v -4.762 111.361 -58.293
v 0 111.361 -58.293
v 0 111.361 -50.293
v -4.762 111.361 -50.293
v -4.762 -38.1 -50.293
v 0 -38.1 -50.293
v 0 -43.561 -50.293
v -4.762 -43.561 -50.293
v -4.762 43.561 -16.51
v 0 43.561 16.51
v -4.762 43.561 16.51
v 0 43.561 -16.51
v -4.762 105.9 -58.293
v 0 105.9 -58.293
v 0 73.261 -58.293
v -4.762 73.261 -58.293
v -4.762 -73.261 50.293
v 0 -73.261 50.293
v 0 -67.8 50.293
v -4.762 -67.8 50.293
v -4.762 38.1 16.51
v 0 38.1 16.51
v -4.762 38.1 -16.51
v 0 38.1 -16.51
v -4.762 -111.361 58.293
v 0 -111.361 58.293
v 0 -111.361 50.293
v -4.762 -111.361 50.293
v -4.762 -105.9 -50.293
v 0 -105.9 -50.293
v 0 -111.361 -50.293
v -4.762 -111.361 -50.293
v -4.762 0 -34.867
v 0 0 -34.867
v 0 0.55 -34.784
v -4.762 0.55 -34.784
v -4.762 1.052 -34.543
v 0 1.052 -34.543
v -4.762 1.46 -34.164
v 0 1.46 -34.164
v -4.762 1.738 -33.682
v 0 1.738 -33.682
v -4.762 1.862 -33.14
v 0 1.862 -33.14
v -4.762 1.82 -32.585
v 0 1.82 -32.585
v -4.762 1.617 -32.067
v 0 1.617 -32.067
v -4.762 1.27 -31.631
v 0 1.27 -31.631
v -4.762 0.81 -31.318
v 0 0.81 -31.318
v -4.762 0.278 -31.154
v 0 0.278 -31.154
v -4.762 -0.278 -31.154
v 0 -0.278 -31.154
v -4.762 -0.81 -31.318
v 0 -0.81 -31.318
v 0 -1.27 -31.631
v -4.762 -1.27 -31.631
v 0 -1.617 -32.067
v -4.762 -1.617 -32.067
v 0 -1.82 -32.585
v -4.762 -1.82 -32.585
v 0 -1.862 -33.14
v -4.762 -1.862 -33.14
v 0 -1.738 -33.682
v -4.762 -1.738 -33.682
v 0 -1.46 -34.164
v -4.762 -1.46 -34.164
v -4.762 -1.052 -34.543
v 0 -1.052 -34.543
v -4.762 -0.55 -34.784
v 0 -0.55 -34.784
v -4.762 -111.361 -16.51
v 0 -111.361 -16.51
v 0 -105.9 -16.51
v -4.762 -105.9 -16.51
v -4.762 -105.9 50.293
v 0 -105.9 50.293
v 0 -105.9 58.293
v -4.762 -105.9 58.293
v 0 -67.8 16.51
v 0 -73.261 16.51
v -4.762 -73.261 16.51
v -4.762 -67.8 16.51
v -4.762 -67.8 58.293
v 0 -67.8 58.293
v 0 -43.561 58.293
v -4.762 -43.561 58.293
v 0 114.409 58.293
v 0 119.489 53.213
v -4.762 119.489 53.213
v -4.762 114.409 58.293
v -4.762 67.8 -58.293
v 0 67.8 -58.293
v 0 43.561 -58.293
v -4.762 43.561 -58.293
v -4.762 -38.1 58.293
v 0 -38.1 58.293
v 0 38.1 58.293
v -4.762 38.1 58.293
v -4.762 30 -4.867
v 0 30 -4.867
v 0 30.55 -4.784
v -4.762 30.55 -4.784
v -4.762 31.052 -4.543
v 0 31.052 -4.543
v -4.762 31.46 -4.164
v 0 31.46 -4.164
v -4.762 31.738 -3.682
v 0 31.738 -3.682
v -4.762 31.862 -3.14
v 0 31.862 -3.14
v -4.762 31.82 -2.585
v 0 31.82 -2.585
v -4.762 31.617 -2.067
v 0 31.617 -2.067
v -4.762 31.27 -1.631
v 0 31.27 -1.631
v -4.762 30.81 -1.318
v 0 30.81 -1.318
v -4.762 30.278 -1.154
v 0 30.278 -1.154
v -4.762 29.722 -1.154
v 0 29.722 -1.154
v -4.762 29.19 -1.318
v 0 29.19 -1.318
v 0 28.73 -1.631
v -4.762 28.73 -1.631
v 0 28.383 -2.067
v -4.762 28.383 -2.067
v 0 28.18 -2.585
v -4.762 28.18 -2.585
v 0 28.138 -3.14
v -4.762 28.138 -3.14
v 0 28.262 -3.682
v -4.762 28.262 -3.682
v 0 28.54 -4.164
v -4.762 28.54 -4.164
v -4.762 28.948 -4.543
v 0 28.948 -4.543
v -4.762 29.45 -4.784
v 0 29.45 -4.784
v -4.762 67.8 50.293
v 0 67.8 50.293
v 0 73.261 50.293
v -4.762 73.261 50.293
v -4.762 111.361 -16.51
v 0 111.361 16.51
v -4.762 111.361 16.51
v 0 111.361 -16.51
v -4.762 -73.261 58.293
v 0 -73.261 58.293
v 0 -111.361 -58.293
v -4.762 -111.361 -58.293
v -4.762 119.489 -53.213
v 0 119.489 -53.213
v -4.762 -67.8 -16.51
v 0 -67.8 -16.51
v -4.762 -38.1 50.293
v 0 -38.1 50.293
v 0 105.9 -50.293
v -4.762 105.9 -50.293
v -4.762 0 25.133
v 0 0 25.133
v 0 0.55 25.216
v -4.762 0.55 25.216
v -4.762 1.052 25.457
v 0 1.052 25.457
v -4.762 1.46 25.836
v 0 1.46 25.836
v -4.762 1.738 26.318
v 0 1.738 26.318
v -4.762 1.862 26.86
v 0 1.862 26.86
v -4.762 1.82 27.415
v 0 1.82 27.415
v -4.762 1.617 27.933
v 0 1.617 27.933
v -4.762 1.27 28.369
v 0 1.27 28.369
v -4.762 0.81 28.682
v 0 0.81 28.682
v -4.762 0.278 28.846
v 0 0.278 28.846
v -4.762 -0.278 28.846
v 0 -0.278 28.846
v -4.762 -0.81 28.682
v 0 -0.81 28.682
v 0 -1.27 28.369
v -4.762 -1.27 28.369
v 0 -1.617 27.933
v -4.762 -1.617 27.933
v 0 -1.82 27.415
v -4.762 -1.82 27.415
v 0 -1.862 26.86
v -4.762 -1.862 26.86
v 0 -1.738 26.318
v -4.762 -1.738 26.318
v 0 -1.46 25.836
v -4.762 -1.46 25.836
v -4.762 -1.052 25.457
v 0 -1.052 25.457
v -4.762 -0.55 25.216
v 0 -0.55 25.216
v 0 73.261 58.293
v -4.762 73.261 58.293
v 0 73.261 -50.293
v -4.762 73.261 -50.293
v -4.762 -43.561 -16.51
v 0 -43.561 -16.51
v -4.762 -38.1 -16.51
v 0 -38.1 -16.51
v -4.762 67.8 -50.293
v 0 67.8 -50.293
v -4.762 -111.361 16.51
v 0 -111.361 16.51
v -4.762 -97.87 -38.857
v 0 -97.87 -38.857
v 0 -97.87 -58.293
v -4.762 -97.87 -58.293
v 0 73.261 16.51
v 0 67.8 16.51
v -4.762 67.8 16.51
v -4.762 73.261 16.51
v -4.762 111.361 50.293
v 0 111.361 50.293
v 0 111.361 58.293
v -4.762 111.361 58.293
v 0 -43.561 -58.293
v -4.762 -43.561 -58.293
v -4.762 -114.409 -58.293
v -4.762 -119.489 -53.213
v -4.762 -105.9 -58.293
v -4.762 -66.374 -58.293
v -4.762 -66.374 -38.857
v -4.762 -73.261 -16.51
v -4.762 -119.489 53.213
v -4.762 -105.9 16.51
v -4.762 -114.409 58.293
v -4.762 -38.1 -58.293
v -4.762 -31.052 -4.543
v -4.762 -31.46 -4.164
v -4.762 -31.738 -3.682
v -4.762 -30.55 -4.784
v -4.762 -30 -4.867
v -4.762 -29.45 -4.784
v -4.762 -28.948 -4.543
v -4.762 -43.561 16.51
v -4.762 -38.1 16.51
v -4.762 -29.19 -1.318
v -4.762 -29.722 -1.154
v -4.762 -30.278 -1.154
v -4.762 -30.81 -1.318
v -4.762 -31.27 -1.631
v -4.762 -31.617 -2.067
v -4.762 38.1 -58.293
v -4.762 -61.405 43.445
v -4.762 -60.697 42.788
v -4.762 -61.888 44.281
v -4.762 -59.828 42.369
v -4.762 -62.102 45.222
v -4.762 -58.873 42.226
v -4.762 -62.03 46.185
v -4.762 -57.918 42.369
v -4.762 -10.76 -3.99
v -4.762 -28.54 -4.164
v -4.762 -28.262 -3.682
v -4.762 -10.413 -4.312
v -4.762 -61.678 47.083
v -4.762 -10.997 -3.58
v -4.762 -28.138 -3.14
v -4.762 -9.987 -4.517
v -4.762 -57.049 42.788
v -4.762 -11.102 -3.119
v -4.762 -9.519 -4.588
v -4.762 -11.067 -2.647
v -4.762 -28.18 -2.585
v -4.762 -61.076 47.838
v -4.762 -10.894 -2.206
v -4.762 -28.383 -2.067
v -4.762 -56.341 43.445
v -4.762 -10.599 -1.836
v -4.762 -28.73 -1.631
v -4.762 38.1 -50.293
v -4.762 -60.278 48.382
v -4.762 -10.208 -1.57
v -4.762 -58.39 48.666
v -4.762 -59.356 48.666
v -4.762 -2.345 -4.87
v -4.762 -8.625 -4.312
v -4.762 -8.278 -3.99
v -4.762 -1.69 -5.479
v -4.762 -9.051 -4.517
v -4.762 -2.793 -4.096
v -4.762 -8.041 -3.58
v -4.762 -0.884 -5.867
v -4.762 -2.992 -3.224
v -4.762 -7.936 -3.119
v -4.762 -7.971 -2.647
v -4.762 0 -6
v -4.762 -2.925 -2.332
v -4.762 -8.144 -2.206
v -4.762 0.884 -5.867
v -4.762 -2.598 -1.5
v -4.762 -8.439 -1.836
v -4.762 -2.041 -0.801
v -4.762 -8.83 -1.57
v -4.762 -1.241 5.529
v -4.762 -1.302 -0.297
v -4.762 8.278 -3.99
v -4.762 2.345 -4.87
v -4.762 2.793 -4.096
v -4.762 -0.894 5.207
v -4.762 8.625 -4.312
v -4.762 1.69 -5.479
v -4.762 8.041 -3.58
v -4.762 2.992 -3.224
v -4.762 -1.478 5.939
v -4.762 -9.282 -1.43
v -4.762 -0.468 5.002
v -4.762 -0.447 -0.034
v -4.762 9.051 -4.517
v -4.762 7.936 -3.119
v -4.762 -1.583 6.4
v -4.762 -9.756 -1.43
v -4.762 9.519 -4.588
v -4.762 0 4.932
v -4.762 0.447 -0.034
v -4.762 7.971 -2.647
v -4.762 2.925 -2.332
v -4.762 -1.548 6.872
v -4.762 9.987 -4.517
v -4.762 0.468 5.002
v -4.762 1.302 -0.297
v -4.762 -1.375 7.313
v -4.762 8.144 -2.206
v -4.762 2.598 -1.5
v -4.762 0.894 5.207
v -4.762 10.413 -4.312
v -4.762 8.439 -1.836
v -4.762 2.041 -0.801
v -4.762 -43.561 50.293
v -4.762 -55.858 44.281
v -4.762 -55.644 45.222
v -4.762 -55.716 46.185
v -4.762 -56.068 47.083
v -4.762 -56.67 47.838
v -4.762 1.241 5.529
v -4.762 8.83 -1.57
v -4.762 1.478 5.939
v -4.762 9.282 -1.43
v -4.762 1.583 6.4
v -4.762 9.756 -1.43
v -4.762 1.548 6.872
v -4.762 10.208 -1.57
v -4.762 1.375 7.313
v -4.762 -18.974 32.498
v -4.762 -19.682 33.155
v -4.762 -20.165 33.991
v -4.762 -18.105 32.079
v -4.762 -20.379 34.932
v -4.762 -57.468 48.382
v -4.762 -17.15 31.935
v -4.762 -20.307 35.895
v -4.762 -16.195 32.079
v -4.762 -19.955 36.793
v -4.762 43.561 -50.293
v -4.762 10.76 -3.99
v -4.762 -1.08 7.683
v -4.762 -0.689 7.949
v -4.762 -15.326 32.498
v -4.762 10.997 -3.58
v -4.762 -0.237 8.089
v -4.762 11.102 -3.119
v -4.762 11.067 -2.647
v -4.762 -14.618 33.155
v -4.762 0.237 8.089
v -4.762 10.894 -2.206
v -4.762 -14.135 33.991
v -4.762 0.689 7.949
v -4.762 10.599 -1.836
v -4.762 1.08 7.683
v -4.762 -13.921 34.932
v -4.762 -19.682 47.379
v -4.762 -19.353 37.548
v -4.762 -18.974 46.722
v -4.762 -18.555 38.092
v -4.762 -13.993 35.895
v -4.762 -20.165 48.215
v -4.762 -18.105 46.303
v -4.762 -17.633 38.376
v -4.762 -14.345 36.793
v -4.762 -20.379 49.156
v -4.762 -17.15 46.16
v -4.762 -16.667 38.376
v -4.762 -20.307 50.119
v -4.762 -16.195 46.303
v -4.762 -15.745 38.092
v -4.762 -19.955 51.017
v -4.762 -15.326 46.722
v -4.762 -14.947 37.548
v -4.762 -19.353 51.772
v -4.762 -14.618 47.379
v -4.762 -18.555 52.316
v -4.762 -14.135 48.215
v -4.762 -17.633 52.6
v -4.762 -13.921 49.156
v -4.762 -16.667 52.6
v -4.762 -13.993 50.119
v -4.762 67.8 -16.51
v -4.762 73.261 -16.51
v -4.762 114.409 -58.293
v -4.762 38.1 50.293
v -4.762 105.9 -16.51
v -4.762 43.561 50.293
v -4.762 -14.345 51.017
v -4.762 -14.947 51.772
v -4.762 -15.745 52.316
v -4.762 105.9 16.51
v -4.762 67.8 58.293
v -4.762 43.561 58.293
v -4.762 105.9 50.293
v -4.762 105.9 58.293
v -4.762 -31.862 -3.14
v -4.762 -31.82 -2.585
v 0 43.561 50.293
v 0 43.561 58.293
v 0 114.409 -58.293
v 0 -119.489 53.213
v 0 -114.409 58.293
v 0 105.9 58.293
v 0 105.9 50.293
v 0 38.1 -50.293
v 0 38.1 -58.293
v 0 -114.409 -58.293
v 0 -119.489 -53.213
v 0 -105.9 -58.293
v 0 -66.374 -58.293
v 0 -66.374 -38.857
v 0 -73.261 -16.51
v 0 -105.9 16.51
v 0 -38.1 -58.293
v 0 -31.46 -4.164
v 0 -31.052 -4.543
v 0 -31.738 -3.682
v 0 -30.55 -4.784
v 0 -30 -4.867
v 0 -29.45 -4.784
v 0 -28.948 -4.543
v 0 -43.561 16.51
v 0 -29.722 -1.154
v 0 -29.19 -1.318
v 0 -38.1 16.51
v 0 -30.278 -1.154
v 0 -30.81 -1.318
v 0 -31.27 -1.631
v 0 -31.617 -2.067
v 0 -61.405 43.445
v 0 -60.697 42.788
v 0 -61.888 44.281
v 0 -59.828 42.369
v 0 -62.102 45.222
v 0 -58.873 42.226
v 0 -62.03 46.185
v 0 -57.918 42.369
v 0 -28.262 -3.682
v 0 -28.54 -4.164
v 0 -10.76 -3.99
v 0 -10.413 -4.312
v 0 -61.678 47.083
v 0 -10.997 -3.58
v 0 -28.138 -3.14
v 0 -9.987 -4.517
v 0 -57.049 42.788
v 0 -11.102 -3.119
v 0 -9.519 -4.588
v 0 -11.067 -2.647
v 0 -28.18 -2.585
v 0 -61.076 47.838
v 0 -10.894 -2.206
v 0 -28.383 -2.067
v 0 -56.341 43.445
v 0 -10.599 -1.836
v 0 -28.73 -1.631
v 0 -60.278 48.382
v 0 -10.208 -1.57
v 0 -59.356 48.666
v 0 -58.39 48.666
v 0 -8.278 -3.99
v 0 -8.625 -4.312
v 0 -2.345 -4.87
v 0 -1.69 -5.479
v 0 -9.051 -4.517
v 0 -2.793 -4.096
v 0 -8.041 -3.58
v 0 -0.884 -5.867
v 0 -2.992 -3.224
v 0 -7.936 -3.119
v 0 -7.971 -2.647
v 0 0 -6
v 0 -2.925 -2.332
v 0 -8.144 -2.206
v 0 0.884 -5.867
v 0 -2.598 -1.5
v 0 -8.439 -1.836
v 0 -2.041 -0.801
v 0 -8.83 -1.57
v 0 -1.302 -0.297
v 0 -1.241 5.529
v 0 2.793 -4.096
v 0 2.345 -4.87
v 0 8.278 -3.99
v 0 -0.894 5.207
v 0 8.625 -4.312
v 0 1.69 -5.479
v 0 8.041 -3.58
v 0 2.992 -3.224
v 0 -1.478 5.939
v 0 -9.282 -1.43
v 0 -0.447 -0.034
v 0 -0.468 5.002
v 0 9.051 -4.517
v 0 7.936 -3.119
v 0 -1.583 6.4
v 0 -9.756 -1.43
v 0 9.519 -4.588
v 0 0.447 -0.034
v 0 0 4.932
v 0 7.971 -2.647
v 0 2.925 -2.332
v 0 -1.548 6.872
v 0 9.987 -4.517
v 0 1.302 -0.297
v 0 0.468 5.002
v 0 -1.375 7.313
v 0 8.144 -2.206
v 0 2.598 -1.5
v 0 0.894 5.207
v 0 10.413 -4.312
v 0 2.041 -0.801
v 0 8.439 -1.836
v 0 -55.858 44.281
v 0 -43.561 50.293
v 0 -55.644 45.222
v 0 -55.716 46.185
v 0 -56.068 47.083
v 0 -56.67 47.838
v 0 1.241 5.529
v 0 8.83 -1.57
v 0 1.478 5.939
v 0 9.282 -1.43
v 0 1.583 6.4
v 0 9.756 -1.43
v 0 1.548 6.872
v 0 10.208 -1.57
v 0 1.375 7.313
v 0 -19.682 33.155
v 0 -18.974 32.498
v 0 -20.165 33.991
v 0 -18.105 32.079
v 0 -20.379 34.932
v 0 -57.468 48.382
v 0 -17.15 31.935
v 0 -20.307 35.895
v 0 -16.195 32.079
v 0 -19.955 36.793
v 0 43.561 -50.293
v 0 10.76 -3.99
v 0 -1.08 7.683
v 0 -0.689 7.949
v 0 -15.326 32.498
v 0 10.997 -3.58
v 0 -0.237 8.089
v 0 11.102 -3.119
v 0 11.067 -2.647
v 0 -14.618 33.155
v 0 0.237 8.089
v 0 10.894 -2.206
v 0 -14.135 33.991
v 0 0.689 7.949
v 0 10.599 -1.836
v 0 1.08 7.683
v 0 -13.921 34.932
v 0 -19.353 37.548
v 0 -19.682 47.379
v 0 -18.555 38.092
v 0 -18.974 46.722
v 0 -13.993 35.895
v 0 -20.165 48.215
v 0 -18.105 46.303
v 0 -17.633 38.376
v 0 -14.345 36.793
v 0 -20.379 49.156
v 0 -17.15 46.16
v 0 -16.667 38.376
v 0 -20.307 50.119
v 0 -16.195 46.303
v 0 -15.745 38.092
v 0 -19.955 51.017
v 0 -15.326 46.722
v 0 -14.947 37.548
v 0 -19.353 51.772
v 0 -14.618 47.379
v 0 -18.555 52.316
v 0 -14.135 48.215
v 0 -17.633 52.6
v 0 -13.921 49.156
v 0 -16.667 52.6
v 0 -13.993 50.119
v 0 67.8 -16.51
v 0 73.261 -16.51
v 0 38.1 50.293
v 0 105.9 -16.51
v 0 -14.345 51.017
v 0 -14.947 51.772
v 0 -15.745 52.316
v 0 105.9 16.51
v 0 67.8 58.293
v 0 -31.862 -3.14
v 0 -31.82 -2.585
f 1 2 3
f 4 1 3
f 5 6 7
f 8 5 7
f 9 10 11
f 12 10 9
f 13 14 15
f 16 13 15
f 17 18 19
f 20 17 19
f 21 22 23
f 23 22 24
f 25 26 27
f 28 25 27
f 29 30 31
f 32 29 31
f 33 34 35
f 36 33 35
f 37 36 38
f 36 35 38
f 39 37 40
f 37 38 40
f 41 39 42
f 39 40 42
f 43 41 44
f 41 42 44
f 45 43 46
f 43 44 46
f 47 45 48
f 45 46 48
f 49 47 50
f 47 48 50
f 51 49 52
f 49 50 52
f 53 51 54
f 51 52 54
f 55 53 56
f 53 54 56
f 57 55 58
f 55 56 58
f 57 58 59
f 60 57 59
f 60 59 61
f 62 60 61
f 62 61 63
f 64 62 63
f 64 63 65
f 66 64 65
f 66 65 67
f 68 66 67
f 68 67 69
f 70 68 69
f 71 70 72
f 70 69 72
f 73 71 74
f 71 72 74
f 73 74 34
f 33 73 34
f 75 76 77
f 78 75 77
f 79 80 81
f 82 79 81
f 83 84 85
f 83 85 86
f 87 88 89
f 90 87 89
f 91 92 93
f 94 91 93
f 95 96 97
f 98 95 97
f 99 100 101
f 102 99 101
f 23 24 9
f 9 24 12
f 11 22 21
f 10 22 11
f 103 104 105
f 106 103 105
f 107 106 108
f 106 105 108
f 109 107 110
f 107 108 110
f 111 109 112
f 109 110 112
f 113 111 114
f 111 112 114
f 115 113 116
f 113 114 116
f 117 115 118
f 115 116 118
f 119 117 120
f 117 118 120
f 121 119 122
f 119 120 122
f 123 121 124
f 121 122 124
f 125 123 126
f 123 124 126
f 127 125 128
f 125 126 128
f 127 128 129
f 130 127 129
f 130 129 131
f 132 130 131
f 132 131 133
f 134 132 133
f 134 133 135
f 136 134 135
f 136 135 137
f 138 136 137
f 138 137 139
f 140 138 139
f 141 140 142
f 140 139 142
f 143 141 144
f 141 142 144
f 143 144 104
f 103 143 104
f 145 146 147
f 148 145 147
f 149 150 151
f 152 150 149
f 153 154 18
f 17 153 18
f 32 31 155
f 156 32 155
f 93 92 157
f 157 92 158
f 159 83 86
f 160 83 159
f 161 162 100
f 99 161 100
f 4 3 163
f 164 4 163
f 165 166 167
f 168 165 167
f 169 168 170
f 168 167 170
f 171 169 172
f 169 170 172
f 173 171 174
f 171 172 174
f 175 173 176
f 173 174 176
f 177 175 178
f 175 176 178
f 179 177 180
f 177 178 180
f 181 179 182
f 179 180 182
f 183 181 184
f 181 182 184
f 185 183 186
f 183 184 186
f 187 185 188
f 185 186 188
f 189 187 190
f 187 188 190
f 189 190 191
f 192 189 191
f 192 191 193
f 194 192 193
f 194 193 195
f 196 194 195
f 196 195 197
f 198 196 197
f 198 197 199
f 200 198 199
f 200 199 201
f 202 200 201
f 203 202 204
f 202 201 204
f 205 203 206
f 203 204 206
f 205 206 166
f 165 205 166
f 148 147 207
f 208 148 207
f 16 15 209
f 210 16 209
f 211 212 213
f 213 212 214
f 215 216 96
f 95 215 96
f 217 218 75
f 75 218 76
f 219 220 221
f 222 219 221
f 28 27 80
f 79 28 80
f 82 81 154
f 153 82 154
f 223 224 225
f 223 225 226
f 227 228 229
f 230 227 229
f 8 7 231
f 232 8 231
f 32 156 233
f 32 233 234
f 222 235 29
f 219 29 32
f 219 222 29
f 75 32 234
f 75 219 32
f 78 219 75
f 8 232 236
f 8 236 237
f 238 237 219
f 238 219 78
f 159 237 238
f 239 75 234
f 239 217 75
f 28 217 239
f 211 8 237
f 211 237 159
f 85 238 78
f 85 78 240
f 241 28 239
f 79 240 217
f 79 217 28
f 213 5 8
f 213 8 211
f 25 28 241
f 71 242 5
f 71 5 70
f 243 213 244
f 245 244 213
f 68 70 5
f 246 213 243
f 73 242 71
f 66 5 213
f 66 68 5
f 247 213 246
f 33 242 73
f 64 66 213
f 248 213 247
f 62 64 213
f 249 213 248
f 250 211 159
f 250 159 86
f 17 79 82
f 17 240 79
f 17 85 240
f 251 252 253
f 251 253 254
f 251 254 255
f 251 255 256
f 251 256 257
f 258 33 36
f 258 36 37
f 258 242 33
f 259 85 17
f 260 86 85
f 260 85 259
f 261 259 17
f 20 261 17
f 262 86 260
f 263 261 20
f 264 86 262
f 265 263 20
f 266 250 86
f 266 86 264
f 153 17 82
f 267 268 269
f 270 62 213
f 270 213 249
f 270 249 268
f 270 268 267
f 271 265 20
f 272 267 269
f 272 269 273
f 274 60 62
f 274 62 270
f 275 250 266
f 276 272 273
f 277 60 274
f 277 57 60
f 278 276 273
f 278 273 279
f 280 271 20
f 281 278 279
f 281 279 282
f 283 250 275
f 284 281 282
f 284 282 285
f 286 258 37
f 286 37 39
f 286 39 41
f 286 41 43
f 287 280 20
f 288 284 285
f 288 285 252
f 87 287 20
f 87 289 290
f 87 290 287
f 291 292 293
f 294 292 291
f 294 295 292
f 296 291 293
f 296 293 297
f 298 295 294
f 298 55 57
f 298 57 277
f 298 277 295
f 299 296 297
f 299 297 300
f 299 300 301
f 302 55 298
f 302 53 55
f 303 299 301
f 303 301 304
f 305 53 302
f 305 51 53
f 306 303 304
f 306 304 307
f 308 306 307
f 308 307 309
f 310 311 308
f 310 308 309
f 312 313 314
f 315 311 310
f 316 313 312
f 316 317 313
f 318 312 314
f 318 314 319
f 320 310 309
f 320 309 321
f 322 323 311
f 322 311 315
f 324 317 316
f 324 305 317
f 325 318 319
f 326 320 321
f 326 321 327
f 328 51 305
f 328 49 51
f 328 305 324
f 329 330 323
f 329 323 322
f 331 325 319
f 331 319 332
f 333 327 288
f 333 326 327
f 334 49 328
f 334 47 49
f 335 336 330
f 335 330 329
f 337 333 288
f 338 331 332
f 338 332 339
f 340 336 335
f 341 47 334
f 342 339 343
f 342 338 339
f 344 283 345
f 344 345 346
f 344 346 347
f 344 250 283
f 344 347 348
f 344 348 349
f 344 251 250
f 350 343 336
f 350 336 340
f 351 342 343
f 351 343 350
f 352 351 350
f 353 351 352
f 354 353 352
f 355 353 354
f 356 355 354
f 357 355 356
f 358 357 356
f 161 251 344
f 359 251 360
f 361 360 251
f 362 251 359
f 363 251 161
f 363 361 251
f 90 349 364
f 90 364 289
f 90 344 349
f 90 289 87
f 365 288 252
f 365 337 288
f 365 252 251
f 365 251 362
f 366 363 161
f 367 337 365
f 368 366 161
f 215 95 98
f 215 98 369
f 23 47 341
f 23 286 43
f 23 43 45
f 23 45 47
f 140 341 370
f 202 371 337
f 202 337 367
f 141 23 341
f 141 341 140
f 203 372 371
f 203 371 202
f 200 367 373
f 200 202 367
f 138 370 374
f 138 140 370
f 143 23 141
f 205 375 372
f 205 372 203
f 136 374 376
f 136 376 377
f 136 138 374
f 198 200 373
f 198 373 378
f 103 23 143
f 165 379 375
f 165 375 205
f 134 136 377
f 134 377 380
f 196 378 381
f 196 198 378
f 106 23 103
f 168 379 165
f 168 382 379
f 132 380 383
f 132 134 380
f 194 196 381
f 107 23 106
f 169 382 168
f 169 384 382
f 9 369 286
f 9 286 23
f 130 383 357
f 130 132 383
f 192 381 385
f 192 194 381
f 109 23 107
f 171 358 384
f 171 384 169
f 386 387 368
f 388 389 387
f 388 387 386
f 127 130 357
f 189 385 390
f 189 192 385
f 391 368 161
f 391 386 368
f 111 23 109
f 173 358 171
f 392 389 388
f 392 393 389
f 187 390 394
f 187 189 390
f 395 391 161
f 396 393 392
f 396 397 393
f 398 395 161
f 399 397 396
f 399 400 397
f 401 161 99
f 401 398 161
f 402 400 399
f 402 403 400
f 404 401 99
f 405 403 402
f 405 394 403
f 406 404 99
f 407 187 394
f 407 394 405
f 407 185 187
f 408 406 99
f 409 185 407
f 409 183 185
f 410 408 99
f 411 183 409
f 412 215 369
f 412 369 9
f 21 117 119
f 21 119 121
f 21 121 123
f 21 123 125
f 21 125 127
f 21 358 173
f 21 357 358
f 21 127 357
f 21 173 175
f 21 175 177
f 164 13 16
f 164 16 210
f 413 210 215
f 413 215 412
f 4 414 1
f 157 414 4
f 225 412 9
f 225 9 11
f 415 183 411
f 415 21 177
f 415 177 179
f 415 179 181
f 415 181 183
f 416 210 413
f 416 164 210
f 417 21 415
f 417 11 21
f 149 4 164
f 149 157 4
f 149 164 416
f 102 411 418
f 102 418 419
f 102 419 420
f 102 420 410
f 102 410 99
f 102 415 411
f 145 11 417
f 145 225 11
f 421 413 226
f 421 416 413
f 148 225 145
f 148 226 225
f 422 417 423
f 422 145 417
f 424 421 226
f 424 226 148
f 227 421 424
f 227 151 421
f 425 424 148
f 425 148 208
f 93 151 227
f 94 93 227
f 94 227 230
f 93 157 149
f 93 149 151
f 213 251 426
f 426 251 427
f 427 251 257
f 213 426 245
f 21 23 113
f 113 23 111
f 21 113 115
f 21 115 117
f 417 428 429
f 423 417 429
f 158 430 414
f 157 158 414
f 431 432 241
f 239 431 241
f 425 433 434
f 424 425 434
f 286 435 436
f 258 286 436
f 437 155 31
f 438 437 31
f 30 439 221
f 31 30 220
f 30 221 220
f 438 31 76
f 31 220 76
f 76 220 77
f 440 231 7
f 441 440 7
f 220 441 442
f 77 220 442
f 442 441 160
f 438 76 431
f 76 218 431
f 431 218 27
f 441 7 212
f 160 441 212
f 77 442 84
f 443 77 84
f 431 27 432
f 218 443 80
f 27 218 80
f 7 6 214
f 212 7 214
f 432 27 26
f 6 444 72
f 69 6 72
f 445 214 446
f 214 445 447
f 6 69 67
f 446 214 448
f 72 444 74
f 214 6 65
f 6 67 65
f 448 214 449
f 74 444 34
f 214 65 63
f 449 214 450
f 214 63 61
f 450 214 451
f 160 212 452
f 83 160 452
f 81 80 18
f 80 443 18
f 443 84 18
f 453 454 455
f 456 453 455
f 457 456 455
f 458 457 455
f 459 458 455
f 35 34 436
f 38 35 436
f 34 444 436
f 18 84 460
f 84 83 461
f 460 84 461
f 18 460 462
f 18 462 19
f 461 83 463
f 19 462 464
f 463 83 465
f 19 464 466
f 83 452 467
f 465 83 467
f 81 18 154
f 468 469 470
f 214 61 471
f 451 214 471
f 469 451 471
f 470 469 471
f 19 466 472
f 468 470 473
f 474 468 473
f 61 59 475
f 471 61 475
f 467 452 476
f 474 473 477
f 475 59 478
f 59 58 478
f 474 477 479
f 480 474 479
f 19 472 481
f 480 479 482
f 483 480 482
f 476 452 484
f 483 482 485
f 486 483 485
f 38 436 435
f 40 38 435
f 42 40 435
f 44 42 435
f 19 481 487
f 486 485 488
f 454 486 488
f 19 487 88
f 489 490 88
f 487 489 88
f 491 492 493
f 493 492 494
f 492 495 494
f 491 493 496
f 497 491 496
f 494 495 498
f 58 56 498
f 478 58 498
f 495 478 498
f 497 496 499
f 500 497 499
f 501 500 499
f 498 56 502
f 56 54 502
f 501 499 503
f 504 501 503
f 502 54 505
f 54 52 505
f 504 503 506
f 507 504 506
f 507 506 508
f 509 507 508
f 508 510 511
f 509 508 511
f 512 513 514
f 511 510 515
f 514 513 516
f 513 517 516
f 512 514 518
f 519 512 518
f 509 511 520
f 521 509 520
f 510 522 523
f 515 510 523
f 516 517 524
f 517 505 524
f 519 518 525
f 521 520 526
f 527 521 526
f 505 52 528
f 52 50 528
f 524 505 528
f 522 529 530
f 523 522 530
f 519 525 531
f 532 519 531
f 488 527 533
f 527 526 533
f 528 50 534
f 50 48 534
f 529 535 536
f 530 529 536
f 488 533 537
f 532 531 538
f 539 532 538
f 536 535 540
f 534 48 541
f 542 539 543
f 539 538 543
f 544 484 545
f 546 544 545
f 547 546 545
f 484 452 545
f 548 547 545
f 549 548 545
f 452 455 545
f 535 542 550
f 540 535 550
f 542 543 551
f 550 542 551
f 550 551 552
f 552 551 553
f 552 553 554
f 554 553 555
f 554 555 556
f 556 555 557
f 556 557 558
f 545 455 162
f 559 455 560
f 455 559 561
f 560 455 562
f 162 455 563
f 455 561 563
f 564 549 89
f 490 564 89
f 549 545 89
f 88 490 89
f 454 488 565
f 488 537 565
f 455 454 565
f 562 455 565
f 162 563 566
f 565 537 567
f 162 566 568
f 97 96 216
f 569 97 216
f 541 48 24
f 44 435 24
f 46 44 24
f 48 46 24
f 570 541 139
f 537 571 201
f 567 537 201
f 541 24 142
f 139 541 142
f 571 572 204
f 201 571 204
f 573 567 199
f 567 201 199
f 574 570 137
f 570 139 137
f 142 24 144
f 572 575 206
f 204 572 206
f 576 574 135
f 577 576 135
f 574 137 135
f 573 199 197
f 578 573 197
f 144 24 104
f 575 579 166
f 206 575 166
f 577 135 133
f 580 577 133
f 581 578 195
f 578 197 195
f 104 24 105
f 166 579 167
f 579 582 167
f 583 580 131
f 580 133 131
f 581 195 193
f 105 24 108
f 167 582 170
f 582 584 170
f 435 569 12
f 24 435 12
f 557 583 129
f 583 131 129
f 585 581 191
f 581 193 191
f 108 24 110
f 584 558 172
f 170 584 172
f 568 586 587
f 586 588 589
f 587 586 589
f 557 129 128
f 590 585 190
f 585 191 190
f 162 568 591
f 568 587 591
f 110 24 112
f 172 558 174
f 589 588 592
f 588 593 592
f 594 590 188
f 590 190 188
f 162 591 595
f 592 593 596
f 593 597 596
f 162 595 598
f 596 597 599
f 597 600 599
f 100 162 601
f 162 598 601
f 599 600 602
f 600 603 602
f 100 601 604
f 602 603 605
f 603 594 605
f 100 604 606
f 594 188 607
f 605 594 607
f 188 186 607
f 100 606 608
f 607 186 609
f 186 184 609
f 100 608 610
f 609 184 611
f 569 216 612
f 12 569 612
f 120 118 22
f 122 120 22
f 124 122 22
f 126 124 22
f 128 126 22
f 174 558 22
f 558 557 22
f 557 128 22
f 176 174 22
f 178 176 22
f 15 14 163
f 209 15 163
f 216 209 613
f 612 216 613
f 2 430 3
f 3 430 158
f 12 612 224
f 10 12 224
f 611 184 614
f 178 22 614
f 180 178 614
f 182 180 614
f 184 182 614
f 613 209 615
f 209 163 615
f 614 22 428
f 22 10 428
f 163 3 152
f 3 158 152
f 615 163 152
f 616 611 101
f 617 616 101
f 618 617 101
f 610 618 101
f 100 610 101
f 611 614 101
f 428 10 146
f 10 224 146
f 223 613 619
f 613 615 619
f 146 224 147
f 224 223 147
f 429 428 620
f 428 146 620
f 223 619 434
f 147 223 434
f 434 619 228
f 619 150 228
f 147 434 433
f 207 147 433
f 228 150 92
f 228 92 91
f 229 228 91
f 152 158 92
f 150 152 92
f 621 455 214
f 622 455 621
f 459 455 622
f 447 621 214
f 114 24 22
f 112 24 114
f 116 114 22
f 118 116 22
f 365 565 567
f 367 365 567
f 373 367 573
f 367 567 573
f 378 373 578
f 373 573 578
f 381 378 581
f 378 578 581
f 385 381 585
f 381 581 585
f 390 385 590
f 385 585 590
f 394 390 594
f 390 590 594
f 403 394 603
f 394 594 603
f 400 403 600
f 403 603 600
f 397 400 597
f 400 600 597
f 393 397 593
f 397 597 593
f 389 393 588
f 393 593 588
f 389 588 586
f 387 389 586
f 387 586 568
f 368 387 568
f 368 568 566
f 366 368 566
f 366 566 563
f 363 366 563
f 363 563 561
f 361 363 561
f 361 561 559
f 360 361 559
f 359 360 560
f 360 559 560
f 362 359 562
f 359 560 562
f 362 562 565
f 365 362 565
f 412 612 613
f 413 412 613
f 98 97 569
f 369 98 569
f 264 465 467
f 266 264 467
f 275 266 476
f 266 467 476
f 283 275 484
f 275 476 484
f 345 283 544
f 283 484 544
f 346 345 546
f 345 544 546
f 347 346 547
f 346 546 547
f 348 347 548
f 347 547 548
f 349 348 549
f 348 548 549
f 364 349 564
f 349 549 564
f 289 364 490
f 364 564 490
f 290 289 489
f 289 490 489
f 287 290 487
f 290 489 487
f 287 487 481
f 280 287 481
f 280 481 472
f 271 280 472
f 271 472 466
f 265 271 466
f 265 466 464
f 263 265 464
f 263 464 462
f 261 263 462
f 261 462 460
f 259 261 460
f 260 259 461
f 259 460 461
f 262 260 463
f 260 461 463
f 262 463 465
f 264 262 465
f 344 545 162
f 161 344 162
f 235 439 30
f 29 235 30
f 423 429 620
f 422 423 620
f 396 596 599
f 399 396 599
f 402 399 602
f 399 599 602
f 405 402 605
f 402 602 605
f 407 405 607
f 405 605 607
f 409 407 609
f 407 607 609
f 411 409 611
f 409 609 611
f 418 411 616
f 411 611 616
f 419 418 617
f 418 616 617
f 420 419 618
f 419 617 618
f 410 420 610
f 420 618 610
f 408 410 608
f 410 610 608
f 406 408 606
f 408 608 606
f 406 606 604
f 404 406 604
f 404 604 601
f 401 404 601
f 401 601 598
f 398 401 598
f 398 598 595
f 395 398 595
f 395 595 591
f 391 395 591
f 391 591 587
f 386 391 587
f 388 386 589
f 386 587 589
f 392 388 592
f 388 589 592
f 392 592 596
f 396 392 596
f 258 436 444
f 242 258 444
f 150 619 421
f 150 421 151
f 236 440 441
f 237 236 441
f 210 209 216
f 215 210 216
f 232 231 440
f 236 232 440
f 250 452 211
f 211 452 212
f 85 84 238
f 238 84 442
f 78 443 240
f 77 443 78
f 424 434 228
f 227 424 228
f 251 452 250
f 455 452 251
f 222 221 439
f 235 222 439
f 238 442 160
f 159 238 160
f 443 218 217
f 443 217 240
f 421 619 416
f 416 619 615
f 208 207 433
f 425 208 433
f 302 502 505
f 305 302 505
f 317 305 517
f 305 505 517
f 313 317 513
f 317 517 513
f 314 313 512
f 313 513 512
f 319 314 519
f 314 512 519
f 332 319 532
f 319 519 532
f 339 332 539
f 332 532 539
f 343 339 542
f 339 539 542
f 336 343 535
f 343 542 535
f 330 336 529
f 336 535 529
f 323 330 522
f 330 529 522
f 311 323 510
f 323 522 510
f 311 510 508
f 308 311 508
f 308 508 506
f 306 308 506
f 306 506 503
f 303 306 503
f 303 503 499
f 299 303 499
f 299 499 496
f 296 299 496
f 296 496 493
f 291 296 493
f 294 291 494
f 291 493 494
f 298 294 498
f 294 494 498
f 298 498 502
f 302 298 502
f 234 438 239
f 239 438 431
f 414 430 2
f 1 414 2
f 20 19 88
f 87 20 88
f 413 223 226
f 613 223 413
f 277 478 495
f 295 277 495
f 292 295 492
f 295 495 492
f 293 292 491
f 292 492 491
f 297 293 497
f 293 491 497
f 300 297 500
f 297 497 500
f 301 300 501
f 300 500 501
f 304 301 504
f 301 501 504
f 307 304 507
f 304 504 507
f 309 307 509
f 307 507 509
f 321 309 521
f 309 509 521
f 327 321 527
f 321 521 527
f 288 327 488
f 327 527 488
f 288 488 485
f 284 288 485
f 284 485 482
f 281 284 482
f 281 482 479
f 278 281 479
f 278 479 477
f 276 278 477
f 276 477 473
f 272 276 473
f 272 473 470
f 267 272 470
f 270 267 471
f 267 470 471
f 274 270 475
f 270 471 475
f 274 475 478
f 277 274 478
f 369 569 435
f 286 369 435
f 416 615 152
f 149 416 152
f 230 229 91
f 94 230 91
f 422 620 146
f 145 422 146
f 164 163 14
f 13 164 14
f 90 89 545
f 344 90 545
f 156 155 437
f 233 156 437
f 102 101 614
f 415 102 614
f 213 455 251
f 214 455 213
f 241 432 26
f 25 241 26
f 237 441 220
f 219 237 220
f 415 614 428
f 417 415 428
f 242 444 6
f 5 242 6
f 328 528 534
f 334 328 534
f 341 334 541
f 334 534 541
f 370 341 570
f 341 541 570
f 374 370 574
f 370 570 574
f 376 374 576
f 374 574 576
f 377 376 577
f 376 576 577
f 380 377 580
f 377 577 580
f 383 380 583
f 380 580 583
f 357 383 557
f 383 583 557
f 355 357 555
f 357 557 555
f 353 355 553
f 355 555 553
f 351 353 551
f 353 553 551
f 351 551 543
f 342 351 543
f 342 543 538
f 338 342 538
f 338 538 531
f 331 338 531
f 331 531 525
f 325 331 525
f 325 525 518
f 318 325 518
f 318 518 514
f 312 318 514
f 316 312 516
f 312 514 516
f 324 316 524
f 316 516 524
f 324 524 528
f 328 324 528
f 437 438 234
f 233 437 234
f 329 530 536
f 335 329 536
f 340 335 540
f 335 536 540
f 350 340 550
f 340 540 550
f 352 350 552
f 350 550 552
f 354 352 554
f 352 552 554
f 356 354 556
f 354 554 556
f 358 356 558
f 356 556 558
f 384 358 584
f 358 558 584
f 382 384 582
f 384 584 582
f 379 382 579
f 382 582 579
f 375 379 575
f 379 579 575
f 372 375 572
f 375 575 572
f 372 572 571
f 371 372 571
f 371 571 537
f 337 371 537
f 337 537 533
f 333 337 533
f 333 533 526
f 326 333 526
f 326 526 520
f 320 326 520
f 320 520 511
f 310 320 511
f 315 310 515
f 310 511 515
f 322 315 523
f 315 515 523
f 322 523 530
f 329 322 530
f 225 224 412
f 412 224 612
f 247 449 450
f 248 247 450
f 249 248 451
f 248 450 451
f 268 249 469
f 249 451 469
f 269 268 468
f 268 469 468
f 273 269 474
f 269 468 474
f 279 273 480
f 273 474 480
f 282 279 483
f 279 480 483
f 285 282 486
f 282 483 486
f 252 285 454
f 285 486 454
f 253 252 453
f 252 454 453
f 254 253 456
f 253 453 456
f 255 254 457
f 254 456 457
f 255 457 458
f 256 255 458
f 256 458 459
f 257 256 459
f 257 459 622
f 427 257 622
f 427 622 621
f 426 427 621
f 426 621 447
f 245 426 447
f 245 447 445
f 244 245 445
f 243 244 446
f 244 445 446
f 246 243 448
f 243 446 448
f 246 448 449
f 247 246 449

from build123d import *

# Parameters (mm, degrees)
SKETCH1_R           = 1.5875
SKETCH1_R_2         = 3
SKETCH1_R_3         = 3.2385
SKETCH1_R_4         = 1.8669
SKETCH1_W           = 33.02
SKETCH1_H           = 5.461
BOSS_EXTRUDE1_DEPTH = 4.7625
CHAMFER1_SIZE       = 5.08


with BuildPart() as part:
    # Sketch1 → Boss-Extrude1 (new body)
    with BuildSketch(Plane(origin=(0, 0, 0), x_dir=(0, 0, -1), z_dir=(1, 0, 0))):
        Polygon((-58.293, 119.489), (58.293, 119.489), (58.293, 111.361), (50.293, 111.361), (50.293, 105.9), (58.293, 105.9), (58.293, 73.261), (50.293, 73.261), (50.293, 67.8), (58.293, 67.8), (58.293, 43.561), (50.293, 43.561), (50.293, 38.1), (58.293, 38.1), (58.293, -38.1), (50.293, -38.1), (50.293, -43.561), (58.293, -43.561), (58.293, -66.374), (38.857, -66.374), (38.857, -97.87), (58.293, -97.87), (58.293, -105.9), (50.293, -105.9), (50.293, -111.361), (58.293, -111.361), (58.293, -119.489), (-58.293, -119.489), (-58.293, -111.361), (-50.293, -111.361), (-50.293, -105.9), (-58.293, -105.9), (-58.293, -73.261), (-50.293, -73.261), (-50.293, -67.8), (-58.293, -67.8), (-58.293, -43.561), (-50.293, -43.561), (-50.293, -38.1), (-58.293, -38.1), (-58.293, 38.1), (-50.293, 38.1), (-50.293, 43.561), (-58.293, 43.561), (-58.293, 67.8), (-50.293, 67.8), (-50.293, 73.261), (-58.293, 73.261), (-58.293, 105.9), (-50.293, 105.9), (-50.293, 111.361), (-58.293, 111.361), align=None)
        with Locations((3, 9.519071488)):
            Circle(SKETCH1_R, mode=Mode.SUBTRACT)
        with Locations((-6.519071488, 0)):
            Circle(SKETCH1_R, mode=Mode.SUBTRACT)
        with Locations((3, -9.519071488)):
            Circle(SKETCH1_R, mode=Mode.SUBTRACT)
        with Locations((3, 0)):
            Circle(SKETCH1_R_2, mode=Mode.SUBTRACT)
        with Locations((-35.174, -17.15)):
            Circle(SKETCH1_R_3, mode=Mode.SUBTRACT)
        with Locations((-49.398, -17.15)):
            Circle(SKETCH1_R_3, mode=Mode.SUBTRACT)
        with Locations((-45.464, -58.872973782)):
            Circle(SKETCH1_R_3, mode=Mode.SUBTRACT)
        with Locations((33, 0)):
            Circle(SKETCH1_R_4, mode=Mode.SUBTRACT)
        with Locations((3, 30)):
            Circle(SKETCH1_R_4, mode=Mode.SUBTRACT)
        with Locations((-27, 0)):
            Circle(SKETCH1_R_4, mode=Mode.SUBTRACT)
        with Locations((3, -30)):
            Circle(SKETCH1_R_4, mode=Mode.SUBTRACT)
        with Locations((0, 108.6305)):
            Rectangle(SKETCH1_W, SKETCH1_H, mode=Mode.SUBTRACT)
        with Locations((0, 70.5305)):
            Rectangle(SKETCH1_W, SKETCH1_H, mode=Mode.SUBTRACT)
        with Locations((0, 40.8305)):
            Rectangle(SKETCH1_W, SKETCH1_H, mode=Mode.SUBTRACT)
        with Locations((0, -40.8305)):
            Rectangle(SKETCH1_W, SKETCH1_H, mode=Mode.SUBTRACT)
        with Locations((0, -70.5305)):
            Rectangle(SKETCH1_W, SKETCH1_H, mode=Mode.SUBTRACT)
        with Locations((0, -108.6305)):
            Rectangle(SKETCH1_W, SKETCH1_H, mode=Mode.SUBTRACT)
    extrude(amount=-BOSS_EXTRUDE1_DEPTH)

    # Chamfer1
    chamfer1_edges = [part.edges().sort_by_distance(p)[0] for p in [
        (-2.38125, 119.489, 58.293),
        (-2.38125, 119.489, -58.293),
        (-2.38125, -119.489, -58.293),
        (-2.38125, -119.489, 58.293),
    ]]
    chamfer(chamfer1_edges, length=CHAMFER1_SIZE)


solid = part.part
